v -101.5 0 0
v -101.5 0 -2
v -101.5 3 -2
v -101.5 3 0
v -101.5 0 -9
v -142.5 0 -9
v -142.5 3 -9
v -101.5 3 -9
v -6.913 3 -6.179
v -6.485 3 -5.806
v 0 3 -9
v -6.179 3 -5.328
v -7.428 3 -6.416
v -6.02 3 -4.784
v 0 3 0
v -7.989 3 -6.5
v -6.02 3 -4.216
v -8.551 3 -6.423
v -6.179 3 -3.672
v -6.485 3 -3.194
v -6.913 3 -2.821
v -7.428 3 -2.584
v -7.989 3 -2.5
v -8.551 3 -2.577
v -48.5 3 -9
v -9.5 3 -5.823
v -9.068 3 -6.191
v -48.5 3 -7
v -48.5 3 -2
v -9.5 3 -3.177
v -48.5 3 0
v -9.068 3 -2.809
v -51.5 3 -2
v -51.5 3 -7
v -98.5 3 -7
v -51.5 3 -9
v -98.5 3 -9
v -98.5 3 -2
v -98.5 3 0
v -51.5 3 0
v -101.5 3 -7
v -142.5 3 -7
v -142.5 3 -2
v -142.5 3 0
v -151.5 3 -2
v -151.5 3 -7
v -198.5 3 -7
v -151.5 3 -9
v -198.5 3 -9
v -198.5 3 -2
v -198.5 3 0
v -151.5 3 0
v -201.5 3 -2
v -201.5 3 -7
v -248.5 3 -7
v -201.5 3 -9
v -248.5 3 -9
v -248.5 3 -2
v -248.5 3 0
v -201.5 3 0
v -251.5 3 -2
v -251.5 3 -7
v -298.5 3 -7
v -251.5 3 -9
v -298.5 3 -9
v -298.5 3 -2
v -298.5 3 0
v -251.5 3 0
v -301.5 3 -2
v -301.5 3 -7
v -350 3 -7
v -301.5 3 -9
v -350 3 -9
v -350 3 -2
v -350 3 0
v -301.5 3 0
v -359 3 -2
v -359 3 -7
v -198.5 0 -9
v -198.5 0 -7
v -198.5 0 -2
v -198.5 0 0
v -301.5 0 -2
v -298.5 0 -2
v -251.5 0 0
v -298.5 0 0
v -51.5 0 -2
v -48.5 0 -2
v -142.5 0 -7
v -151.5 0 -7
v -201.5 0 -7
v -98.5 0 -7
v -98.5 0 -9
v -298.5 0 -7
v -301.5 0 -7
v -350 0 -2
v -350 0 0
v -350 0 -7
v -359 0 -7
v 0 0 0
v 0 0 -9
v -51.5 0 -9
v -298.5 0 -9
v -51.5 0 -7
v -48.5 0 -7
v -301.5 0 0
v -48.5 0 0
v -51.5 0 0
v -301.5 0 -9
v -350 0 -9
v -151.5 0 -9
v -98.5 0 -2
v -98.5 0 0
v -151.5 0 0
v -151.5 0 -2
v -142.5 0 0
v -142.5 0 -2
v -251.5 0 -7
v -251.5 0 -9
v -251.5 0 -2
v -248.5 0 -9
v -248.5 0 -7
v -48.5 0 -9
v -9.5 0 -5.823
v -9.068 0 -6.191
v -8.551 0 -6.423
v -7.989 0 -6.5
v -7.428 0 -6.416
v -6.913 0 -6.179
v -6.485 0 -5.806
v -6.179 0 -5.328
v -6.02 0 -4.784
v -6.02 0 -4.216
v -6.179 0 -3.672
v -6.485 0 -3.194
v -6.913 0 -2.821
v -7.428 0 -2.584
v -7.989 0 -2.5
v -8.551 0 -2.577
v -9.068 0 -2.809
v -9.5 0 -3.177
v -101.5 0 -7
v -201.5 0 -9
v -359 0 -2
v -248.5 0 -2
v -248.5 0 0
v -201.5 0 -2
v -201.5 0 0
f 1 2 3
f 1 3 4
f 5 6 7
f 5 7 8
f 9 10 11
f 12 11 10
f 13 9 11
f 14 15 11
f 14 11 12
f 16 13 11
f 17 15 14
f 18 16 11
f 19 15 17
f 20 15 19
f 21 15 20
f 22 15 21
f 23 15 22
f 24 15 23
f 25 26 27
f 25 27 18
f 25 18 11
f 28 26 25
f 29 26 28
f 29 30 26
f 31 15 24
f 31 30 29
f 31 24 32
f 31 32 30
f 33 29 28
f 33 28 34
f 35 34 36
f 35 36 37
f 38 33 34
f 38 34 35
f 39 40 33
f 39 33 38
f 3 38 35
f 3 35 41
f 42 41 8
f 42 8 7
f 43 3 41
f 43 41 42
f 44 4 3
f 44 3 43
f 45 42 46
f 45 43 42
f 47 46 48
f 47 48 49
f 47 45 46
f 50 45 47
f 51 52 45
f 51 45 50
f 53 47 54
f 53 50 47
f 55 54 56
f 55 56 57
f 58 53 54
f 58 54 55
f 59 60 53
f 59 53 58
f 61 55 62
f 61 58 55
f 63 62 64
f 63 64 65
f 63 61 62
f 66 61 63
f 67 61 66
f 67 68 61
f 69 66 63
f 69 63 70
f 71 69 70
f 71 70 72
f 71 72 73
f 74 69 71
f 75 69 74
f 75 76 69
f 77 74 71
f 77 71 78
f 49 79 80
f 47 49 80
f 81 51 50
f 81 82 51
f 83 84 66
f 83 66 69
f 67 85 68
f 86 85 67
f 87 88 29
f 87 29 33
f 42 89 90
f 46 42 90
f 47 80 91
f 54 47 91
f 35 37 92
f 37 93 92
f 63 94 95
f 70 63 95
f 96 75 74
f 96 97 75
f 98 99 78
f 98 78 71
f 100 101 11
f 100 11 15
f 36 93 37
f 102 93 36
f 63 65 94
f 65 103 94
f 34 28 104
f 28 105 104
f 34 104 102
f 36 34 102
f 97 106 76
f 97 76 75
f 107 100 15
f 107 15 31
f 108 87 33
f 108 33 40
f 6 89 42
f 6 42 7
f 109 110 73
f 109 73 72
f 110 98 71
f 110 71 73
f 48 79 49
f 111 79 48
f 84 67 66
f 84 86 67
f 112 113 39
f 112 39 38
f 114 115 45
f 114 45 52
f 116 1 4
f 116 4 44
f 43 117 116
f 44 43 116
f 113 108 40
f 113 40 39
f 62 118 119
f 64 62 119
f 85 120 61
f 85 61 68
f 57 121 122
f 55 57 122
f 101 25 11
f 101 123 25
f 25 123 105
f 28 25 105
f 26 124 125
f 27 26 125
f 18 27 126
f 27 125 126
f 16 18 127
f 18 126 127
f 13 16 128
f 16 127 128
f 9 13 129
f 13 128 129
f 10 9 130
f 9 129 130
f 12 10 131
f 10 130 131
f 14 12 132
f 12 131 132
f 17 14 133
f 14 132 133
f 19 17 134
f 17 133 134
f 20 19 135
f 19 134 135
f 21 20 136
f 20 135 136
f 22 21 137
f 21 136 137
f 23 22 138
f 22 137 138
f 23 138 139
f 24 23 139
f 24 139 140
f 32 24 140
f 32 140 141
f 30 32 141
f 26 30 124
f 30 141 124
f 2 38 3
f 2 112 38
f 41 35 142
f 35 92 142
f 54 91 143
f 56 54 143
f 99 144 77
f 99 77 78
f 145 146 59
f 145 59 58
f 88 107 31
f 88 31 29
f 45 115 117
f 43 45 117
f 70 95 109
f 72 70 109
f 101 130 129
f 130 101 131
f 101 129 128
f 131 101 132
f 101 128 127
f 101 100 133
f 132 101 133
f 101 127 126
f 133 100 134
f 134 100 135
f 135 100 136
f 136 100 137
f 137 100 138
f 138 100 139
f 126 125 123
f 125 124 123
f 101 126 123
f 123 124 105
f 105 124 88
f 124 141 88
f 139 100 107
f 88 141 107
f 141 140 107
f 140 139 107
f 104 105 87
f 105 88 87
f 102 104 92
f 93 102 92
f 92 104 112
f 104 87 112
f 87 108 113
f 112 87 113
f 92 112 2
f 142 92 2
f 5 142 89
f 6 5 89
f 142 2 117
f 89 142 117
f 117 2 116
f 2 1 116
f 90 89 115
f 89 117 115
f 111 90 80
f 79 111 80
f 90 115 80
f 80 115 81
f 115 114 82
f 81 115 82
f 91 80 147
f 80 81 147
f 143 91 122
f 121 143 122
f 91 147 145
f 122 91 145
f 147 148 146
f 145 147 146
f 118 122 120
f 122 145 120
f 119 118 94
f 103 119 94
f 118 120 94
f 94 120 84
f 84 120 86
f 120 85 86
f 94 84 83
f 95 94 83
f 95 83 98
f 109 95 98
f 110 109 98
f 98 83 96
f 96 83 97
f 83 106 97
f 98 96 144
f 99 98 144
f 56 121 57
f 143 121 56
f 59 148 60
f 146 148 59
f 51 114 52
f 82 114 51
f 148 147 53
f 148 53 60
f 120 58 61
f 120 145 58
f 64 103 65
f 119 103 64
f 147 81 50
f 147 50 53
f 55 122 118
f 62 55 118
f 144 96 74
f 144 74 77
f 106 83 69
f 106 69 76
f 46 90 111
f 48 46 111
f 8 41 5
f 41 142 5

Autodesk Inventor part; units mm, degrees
ref_plane "YZ Plane" through (0, 0, 0) normal (1, 0, 0) x (0, 1, 0)
ref_plane "XZ Plane" through (0, 0, 0) normal (0, 1, 0) x (-1, 0, 0)
ref_plane "XY Plane" through (0, 0, 0) normal (0, 0, 1) x (1, 0, 0)
sketch "草圖1" plane through (0, 0, 0) normal (0, 1, 0) x (-1, 0, 0)
  line L0 (0, 0) -> (350, 0)
  line L1 (350, 0) -> (350, -9)
  line L2 (350, -9) -> (0, -9)
  line L3 (0, -9) -> (0, 0)
  arc A0 (9.5, -3.1771) -> (9.5, -5.8229) centre (8, -4.5) ccw
  line L4 (0, -4.5) -> (350, -4.5)
  line L5 (301.5, -9) -> (298.5, -9)
  line L6 (298.5, -9) -> (298.5, -7)
  line L7 (298.5, -7) -> (301.5, -7)
  line L8 (301.5, -7) -> (301.5, -9)
  line L9 (298.5, 0) -> (298.5, -2)
  line L10 (298.5, -2) -> (301.5, -2)
  line L11 (301.5, -2) -> (301.5, 0)
  line L12 (248.5, -9) -> (248.5, -7)
  line L13 (248.5, -7) -> (251.5, -7)
  line L14 (251.5, -7) -> (251.5, -9)
  line L15 (248.5, 0) -> (248.5, -2)
  line L16 (248.5, -2) -> (251.5, -2)
  line L17 (251.5, -2) -> (251.5, 0)
  line L18 (198.5, -9) -> (198.5, -7)
  line L19 (198.5, -7) -> (201.5, -7)
  line L20 (201.5, -7) -> (201.5, -9)
  line L21 (198.5, 0) -> (198.5, -2)
  line L22 (198.5, -2) -> (201.5, -2)
  line L23 (201.5, -2) -> (201.5, 0)
  line L24 (148.5, -9) -> (148.5, -7)
  line L25 (148.5, -7) -> (151.5, -7)
  line L26 (151.5, -7) -> (151.5, -9)
  line L27 (148.5, 0) -> (148.5, -2)
  line L28 (148.5, -2) -> (151.5, -2)
  line L29 (151.5, -2) -> (151.5, 0)
  line L30 (98.5, -9) -> (98.5, -7)
  line L31 (98.5, -7) -> (101.5, -7)
  line L32 (101.5, -7) -> (101.5, -9)
  line L33 (98.5, 0) -> (98.5, -2)
  line L34 (98.5, -2) -> (101.5, -2)
  line L35 (101.5, -2) -> (101.5, 0)
  line L36 (48.5, -9) -> (48.5, -7)
  line L37 (48.5, -7) -> (51.5, -7)
  line L38 (51.5, -7) -> (51.5, -9)
  line L39 (48.5, 0) -> (48.5, -2)
  line L40 (48.5, -2) -> (51.5, -2)
  line L41 (51.5, -2) -> (51.5, 0)
  line L42 (350, -2) -> (359, -2)
  line L43 (359, -2) -> (359, -7)
  line L44 (359, -7) -> (350, -7)
  line L45 (350, -7) -> (350, -2)
  line L46 (9.5, -3.1771) -> (9.5, -5.8229)
  line L47 (148.5, -2) -> (142.5, -2)
  line L48 (142.5, -2) -> (142.5, 0)
  line L49 (148.5, -7) -> (142.5, -7)
  line L50 (142.5, -7) -> (142.5, -9)
  point P0 (300, -9)
  point P1 (301.5, 0)
  point P2 (298.5, 0)
  point P3 (251.5, 0)
  point P4 (248.5, 0)
  point P5 (201.5, 0)
  point P6 (198.5, 0)
  point P7 (151.5, 0)
  point P8 (148.5, 0)
  point P9 (101.5, 0)
  point P10 (98.5, 0)
  point P11 (51.5, 0)
  point P12 (48.5, 0)
  point P13 (48.5, -9)
  point P14 (51.5, -9)
  point P15 (98.5, -9)
  point P16 (101.5, -9)
  point P17 (148.5, -9)
  point P18 (151.5, -9)
  point P19 (198.5, -9)
  point P20 (201.5, -9)
  point P21 (248.5, -9)
  point P22 (251.5, -9)
  point P23 (298.5, -9)
  point P24 (301.5, -9)
  dimension "d0" = 350
  dimension "d1" = 9
  dimension "d2" = 4
  dimension "d3" = 8
  dimension "d4" = 3
  dimension "d5" = 2
  dimension "d6" = 50
  dimension "d9" = 50
  dimension "d14" = 5
  dimension "d15" = 9
  dimension "d16" = 1.5
  dimension "d19" = 6
  dimension "d20" = 6
extrude "擠出1" add sketch "草圖1" along normal blind 3 contours L0 L39 L40 L41 L33 L34 L35 L48 L47 L28 L29 L21 L22 L23 L15 L16 L17 L9 L10 L11 L1 L4 L46 A0 L3 | L4 A0 L46 L1 L2 L8 L7 L6 L14 L13 L12 L20 L19 L18 L26 L25 L49 L50 L32 L31 L30 L38 L37 L36 L3 | L1 L42 L43 L44
properties part number "main_Bar_3" material "木材 (樺木)"
